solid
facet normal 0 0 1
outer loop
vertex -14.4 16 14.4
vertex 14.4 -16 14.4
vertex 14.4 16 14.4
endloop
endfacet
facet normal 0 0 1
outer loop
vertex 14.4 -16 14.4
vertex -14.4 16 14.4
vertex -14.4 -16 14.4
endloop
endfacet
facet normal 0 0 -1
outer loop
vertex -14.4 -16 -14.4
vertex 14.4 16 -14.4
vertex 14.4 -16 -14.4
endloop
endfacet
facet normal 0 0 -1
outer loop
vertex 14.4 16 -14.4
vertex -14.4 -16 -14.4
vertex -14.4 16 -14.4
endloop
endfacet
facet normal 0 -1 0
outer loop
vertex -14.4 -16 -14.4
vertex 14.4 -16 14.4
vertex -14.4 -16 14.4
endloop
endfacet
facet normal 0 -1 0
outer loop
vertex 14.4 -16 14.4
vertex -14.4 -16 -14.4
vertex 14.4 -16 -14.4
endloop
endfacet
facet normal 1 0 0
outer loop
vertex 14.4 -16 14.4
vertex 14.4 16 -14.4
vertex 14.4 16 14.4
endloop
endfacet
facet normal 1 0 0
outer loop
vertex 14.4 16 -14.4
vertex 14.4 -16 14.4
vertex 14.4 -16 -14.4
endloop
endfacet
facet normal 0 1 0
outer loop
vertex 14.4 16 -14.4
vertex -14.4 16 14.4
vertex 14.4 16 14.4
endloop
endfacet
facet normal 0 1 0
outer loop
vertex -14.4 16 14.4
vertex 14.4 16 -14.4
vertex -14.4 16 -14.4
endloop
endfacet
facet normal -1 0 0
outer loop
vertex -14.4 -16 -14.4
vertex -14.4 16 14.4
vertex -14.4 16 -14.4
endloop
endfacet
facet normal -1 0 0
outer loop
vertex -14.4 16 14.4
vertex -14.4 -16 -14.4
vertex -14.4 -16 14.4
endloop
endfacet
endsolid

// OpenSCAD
size=32; //block=32 //item=8



cube([size*0.9,size*1,size*0.9],center=true);
